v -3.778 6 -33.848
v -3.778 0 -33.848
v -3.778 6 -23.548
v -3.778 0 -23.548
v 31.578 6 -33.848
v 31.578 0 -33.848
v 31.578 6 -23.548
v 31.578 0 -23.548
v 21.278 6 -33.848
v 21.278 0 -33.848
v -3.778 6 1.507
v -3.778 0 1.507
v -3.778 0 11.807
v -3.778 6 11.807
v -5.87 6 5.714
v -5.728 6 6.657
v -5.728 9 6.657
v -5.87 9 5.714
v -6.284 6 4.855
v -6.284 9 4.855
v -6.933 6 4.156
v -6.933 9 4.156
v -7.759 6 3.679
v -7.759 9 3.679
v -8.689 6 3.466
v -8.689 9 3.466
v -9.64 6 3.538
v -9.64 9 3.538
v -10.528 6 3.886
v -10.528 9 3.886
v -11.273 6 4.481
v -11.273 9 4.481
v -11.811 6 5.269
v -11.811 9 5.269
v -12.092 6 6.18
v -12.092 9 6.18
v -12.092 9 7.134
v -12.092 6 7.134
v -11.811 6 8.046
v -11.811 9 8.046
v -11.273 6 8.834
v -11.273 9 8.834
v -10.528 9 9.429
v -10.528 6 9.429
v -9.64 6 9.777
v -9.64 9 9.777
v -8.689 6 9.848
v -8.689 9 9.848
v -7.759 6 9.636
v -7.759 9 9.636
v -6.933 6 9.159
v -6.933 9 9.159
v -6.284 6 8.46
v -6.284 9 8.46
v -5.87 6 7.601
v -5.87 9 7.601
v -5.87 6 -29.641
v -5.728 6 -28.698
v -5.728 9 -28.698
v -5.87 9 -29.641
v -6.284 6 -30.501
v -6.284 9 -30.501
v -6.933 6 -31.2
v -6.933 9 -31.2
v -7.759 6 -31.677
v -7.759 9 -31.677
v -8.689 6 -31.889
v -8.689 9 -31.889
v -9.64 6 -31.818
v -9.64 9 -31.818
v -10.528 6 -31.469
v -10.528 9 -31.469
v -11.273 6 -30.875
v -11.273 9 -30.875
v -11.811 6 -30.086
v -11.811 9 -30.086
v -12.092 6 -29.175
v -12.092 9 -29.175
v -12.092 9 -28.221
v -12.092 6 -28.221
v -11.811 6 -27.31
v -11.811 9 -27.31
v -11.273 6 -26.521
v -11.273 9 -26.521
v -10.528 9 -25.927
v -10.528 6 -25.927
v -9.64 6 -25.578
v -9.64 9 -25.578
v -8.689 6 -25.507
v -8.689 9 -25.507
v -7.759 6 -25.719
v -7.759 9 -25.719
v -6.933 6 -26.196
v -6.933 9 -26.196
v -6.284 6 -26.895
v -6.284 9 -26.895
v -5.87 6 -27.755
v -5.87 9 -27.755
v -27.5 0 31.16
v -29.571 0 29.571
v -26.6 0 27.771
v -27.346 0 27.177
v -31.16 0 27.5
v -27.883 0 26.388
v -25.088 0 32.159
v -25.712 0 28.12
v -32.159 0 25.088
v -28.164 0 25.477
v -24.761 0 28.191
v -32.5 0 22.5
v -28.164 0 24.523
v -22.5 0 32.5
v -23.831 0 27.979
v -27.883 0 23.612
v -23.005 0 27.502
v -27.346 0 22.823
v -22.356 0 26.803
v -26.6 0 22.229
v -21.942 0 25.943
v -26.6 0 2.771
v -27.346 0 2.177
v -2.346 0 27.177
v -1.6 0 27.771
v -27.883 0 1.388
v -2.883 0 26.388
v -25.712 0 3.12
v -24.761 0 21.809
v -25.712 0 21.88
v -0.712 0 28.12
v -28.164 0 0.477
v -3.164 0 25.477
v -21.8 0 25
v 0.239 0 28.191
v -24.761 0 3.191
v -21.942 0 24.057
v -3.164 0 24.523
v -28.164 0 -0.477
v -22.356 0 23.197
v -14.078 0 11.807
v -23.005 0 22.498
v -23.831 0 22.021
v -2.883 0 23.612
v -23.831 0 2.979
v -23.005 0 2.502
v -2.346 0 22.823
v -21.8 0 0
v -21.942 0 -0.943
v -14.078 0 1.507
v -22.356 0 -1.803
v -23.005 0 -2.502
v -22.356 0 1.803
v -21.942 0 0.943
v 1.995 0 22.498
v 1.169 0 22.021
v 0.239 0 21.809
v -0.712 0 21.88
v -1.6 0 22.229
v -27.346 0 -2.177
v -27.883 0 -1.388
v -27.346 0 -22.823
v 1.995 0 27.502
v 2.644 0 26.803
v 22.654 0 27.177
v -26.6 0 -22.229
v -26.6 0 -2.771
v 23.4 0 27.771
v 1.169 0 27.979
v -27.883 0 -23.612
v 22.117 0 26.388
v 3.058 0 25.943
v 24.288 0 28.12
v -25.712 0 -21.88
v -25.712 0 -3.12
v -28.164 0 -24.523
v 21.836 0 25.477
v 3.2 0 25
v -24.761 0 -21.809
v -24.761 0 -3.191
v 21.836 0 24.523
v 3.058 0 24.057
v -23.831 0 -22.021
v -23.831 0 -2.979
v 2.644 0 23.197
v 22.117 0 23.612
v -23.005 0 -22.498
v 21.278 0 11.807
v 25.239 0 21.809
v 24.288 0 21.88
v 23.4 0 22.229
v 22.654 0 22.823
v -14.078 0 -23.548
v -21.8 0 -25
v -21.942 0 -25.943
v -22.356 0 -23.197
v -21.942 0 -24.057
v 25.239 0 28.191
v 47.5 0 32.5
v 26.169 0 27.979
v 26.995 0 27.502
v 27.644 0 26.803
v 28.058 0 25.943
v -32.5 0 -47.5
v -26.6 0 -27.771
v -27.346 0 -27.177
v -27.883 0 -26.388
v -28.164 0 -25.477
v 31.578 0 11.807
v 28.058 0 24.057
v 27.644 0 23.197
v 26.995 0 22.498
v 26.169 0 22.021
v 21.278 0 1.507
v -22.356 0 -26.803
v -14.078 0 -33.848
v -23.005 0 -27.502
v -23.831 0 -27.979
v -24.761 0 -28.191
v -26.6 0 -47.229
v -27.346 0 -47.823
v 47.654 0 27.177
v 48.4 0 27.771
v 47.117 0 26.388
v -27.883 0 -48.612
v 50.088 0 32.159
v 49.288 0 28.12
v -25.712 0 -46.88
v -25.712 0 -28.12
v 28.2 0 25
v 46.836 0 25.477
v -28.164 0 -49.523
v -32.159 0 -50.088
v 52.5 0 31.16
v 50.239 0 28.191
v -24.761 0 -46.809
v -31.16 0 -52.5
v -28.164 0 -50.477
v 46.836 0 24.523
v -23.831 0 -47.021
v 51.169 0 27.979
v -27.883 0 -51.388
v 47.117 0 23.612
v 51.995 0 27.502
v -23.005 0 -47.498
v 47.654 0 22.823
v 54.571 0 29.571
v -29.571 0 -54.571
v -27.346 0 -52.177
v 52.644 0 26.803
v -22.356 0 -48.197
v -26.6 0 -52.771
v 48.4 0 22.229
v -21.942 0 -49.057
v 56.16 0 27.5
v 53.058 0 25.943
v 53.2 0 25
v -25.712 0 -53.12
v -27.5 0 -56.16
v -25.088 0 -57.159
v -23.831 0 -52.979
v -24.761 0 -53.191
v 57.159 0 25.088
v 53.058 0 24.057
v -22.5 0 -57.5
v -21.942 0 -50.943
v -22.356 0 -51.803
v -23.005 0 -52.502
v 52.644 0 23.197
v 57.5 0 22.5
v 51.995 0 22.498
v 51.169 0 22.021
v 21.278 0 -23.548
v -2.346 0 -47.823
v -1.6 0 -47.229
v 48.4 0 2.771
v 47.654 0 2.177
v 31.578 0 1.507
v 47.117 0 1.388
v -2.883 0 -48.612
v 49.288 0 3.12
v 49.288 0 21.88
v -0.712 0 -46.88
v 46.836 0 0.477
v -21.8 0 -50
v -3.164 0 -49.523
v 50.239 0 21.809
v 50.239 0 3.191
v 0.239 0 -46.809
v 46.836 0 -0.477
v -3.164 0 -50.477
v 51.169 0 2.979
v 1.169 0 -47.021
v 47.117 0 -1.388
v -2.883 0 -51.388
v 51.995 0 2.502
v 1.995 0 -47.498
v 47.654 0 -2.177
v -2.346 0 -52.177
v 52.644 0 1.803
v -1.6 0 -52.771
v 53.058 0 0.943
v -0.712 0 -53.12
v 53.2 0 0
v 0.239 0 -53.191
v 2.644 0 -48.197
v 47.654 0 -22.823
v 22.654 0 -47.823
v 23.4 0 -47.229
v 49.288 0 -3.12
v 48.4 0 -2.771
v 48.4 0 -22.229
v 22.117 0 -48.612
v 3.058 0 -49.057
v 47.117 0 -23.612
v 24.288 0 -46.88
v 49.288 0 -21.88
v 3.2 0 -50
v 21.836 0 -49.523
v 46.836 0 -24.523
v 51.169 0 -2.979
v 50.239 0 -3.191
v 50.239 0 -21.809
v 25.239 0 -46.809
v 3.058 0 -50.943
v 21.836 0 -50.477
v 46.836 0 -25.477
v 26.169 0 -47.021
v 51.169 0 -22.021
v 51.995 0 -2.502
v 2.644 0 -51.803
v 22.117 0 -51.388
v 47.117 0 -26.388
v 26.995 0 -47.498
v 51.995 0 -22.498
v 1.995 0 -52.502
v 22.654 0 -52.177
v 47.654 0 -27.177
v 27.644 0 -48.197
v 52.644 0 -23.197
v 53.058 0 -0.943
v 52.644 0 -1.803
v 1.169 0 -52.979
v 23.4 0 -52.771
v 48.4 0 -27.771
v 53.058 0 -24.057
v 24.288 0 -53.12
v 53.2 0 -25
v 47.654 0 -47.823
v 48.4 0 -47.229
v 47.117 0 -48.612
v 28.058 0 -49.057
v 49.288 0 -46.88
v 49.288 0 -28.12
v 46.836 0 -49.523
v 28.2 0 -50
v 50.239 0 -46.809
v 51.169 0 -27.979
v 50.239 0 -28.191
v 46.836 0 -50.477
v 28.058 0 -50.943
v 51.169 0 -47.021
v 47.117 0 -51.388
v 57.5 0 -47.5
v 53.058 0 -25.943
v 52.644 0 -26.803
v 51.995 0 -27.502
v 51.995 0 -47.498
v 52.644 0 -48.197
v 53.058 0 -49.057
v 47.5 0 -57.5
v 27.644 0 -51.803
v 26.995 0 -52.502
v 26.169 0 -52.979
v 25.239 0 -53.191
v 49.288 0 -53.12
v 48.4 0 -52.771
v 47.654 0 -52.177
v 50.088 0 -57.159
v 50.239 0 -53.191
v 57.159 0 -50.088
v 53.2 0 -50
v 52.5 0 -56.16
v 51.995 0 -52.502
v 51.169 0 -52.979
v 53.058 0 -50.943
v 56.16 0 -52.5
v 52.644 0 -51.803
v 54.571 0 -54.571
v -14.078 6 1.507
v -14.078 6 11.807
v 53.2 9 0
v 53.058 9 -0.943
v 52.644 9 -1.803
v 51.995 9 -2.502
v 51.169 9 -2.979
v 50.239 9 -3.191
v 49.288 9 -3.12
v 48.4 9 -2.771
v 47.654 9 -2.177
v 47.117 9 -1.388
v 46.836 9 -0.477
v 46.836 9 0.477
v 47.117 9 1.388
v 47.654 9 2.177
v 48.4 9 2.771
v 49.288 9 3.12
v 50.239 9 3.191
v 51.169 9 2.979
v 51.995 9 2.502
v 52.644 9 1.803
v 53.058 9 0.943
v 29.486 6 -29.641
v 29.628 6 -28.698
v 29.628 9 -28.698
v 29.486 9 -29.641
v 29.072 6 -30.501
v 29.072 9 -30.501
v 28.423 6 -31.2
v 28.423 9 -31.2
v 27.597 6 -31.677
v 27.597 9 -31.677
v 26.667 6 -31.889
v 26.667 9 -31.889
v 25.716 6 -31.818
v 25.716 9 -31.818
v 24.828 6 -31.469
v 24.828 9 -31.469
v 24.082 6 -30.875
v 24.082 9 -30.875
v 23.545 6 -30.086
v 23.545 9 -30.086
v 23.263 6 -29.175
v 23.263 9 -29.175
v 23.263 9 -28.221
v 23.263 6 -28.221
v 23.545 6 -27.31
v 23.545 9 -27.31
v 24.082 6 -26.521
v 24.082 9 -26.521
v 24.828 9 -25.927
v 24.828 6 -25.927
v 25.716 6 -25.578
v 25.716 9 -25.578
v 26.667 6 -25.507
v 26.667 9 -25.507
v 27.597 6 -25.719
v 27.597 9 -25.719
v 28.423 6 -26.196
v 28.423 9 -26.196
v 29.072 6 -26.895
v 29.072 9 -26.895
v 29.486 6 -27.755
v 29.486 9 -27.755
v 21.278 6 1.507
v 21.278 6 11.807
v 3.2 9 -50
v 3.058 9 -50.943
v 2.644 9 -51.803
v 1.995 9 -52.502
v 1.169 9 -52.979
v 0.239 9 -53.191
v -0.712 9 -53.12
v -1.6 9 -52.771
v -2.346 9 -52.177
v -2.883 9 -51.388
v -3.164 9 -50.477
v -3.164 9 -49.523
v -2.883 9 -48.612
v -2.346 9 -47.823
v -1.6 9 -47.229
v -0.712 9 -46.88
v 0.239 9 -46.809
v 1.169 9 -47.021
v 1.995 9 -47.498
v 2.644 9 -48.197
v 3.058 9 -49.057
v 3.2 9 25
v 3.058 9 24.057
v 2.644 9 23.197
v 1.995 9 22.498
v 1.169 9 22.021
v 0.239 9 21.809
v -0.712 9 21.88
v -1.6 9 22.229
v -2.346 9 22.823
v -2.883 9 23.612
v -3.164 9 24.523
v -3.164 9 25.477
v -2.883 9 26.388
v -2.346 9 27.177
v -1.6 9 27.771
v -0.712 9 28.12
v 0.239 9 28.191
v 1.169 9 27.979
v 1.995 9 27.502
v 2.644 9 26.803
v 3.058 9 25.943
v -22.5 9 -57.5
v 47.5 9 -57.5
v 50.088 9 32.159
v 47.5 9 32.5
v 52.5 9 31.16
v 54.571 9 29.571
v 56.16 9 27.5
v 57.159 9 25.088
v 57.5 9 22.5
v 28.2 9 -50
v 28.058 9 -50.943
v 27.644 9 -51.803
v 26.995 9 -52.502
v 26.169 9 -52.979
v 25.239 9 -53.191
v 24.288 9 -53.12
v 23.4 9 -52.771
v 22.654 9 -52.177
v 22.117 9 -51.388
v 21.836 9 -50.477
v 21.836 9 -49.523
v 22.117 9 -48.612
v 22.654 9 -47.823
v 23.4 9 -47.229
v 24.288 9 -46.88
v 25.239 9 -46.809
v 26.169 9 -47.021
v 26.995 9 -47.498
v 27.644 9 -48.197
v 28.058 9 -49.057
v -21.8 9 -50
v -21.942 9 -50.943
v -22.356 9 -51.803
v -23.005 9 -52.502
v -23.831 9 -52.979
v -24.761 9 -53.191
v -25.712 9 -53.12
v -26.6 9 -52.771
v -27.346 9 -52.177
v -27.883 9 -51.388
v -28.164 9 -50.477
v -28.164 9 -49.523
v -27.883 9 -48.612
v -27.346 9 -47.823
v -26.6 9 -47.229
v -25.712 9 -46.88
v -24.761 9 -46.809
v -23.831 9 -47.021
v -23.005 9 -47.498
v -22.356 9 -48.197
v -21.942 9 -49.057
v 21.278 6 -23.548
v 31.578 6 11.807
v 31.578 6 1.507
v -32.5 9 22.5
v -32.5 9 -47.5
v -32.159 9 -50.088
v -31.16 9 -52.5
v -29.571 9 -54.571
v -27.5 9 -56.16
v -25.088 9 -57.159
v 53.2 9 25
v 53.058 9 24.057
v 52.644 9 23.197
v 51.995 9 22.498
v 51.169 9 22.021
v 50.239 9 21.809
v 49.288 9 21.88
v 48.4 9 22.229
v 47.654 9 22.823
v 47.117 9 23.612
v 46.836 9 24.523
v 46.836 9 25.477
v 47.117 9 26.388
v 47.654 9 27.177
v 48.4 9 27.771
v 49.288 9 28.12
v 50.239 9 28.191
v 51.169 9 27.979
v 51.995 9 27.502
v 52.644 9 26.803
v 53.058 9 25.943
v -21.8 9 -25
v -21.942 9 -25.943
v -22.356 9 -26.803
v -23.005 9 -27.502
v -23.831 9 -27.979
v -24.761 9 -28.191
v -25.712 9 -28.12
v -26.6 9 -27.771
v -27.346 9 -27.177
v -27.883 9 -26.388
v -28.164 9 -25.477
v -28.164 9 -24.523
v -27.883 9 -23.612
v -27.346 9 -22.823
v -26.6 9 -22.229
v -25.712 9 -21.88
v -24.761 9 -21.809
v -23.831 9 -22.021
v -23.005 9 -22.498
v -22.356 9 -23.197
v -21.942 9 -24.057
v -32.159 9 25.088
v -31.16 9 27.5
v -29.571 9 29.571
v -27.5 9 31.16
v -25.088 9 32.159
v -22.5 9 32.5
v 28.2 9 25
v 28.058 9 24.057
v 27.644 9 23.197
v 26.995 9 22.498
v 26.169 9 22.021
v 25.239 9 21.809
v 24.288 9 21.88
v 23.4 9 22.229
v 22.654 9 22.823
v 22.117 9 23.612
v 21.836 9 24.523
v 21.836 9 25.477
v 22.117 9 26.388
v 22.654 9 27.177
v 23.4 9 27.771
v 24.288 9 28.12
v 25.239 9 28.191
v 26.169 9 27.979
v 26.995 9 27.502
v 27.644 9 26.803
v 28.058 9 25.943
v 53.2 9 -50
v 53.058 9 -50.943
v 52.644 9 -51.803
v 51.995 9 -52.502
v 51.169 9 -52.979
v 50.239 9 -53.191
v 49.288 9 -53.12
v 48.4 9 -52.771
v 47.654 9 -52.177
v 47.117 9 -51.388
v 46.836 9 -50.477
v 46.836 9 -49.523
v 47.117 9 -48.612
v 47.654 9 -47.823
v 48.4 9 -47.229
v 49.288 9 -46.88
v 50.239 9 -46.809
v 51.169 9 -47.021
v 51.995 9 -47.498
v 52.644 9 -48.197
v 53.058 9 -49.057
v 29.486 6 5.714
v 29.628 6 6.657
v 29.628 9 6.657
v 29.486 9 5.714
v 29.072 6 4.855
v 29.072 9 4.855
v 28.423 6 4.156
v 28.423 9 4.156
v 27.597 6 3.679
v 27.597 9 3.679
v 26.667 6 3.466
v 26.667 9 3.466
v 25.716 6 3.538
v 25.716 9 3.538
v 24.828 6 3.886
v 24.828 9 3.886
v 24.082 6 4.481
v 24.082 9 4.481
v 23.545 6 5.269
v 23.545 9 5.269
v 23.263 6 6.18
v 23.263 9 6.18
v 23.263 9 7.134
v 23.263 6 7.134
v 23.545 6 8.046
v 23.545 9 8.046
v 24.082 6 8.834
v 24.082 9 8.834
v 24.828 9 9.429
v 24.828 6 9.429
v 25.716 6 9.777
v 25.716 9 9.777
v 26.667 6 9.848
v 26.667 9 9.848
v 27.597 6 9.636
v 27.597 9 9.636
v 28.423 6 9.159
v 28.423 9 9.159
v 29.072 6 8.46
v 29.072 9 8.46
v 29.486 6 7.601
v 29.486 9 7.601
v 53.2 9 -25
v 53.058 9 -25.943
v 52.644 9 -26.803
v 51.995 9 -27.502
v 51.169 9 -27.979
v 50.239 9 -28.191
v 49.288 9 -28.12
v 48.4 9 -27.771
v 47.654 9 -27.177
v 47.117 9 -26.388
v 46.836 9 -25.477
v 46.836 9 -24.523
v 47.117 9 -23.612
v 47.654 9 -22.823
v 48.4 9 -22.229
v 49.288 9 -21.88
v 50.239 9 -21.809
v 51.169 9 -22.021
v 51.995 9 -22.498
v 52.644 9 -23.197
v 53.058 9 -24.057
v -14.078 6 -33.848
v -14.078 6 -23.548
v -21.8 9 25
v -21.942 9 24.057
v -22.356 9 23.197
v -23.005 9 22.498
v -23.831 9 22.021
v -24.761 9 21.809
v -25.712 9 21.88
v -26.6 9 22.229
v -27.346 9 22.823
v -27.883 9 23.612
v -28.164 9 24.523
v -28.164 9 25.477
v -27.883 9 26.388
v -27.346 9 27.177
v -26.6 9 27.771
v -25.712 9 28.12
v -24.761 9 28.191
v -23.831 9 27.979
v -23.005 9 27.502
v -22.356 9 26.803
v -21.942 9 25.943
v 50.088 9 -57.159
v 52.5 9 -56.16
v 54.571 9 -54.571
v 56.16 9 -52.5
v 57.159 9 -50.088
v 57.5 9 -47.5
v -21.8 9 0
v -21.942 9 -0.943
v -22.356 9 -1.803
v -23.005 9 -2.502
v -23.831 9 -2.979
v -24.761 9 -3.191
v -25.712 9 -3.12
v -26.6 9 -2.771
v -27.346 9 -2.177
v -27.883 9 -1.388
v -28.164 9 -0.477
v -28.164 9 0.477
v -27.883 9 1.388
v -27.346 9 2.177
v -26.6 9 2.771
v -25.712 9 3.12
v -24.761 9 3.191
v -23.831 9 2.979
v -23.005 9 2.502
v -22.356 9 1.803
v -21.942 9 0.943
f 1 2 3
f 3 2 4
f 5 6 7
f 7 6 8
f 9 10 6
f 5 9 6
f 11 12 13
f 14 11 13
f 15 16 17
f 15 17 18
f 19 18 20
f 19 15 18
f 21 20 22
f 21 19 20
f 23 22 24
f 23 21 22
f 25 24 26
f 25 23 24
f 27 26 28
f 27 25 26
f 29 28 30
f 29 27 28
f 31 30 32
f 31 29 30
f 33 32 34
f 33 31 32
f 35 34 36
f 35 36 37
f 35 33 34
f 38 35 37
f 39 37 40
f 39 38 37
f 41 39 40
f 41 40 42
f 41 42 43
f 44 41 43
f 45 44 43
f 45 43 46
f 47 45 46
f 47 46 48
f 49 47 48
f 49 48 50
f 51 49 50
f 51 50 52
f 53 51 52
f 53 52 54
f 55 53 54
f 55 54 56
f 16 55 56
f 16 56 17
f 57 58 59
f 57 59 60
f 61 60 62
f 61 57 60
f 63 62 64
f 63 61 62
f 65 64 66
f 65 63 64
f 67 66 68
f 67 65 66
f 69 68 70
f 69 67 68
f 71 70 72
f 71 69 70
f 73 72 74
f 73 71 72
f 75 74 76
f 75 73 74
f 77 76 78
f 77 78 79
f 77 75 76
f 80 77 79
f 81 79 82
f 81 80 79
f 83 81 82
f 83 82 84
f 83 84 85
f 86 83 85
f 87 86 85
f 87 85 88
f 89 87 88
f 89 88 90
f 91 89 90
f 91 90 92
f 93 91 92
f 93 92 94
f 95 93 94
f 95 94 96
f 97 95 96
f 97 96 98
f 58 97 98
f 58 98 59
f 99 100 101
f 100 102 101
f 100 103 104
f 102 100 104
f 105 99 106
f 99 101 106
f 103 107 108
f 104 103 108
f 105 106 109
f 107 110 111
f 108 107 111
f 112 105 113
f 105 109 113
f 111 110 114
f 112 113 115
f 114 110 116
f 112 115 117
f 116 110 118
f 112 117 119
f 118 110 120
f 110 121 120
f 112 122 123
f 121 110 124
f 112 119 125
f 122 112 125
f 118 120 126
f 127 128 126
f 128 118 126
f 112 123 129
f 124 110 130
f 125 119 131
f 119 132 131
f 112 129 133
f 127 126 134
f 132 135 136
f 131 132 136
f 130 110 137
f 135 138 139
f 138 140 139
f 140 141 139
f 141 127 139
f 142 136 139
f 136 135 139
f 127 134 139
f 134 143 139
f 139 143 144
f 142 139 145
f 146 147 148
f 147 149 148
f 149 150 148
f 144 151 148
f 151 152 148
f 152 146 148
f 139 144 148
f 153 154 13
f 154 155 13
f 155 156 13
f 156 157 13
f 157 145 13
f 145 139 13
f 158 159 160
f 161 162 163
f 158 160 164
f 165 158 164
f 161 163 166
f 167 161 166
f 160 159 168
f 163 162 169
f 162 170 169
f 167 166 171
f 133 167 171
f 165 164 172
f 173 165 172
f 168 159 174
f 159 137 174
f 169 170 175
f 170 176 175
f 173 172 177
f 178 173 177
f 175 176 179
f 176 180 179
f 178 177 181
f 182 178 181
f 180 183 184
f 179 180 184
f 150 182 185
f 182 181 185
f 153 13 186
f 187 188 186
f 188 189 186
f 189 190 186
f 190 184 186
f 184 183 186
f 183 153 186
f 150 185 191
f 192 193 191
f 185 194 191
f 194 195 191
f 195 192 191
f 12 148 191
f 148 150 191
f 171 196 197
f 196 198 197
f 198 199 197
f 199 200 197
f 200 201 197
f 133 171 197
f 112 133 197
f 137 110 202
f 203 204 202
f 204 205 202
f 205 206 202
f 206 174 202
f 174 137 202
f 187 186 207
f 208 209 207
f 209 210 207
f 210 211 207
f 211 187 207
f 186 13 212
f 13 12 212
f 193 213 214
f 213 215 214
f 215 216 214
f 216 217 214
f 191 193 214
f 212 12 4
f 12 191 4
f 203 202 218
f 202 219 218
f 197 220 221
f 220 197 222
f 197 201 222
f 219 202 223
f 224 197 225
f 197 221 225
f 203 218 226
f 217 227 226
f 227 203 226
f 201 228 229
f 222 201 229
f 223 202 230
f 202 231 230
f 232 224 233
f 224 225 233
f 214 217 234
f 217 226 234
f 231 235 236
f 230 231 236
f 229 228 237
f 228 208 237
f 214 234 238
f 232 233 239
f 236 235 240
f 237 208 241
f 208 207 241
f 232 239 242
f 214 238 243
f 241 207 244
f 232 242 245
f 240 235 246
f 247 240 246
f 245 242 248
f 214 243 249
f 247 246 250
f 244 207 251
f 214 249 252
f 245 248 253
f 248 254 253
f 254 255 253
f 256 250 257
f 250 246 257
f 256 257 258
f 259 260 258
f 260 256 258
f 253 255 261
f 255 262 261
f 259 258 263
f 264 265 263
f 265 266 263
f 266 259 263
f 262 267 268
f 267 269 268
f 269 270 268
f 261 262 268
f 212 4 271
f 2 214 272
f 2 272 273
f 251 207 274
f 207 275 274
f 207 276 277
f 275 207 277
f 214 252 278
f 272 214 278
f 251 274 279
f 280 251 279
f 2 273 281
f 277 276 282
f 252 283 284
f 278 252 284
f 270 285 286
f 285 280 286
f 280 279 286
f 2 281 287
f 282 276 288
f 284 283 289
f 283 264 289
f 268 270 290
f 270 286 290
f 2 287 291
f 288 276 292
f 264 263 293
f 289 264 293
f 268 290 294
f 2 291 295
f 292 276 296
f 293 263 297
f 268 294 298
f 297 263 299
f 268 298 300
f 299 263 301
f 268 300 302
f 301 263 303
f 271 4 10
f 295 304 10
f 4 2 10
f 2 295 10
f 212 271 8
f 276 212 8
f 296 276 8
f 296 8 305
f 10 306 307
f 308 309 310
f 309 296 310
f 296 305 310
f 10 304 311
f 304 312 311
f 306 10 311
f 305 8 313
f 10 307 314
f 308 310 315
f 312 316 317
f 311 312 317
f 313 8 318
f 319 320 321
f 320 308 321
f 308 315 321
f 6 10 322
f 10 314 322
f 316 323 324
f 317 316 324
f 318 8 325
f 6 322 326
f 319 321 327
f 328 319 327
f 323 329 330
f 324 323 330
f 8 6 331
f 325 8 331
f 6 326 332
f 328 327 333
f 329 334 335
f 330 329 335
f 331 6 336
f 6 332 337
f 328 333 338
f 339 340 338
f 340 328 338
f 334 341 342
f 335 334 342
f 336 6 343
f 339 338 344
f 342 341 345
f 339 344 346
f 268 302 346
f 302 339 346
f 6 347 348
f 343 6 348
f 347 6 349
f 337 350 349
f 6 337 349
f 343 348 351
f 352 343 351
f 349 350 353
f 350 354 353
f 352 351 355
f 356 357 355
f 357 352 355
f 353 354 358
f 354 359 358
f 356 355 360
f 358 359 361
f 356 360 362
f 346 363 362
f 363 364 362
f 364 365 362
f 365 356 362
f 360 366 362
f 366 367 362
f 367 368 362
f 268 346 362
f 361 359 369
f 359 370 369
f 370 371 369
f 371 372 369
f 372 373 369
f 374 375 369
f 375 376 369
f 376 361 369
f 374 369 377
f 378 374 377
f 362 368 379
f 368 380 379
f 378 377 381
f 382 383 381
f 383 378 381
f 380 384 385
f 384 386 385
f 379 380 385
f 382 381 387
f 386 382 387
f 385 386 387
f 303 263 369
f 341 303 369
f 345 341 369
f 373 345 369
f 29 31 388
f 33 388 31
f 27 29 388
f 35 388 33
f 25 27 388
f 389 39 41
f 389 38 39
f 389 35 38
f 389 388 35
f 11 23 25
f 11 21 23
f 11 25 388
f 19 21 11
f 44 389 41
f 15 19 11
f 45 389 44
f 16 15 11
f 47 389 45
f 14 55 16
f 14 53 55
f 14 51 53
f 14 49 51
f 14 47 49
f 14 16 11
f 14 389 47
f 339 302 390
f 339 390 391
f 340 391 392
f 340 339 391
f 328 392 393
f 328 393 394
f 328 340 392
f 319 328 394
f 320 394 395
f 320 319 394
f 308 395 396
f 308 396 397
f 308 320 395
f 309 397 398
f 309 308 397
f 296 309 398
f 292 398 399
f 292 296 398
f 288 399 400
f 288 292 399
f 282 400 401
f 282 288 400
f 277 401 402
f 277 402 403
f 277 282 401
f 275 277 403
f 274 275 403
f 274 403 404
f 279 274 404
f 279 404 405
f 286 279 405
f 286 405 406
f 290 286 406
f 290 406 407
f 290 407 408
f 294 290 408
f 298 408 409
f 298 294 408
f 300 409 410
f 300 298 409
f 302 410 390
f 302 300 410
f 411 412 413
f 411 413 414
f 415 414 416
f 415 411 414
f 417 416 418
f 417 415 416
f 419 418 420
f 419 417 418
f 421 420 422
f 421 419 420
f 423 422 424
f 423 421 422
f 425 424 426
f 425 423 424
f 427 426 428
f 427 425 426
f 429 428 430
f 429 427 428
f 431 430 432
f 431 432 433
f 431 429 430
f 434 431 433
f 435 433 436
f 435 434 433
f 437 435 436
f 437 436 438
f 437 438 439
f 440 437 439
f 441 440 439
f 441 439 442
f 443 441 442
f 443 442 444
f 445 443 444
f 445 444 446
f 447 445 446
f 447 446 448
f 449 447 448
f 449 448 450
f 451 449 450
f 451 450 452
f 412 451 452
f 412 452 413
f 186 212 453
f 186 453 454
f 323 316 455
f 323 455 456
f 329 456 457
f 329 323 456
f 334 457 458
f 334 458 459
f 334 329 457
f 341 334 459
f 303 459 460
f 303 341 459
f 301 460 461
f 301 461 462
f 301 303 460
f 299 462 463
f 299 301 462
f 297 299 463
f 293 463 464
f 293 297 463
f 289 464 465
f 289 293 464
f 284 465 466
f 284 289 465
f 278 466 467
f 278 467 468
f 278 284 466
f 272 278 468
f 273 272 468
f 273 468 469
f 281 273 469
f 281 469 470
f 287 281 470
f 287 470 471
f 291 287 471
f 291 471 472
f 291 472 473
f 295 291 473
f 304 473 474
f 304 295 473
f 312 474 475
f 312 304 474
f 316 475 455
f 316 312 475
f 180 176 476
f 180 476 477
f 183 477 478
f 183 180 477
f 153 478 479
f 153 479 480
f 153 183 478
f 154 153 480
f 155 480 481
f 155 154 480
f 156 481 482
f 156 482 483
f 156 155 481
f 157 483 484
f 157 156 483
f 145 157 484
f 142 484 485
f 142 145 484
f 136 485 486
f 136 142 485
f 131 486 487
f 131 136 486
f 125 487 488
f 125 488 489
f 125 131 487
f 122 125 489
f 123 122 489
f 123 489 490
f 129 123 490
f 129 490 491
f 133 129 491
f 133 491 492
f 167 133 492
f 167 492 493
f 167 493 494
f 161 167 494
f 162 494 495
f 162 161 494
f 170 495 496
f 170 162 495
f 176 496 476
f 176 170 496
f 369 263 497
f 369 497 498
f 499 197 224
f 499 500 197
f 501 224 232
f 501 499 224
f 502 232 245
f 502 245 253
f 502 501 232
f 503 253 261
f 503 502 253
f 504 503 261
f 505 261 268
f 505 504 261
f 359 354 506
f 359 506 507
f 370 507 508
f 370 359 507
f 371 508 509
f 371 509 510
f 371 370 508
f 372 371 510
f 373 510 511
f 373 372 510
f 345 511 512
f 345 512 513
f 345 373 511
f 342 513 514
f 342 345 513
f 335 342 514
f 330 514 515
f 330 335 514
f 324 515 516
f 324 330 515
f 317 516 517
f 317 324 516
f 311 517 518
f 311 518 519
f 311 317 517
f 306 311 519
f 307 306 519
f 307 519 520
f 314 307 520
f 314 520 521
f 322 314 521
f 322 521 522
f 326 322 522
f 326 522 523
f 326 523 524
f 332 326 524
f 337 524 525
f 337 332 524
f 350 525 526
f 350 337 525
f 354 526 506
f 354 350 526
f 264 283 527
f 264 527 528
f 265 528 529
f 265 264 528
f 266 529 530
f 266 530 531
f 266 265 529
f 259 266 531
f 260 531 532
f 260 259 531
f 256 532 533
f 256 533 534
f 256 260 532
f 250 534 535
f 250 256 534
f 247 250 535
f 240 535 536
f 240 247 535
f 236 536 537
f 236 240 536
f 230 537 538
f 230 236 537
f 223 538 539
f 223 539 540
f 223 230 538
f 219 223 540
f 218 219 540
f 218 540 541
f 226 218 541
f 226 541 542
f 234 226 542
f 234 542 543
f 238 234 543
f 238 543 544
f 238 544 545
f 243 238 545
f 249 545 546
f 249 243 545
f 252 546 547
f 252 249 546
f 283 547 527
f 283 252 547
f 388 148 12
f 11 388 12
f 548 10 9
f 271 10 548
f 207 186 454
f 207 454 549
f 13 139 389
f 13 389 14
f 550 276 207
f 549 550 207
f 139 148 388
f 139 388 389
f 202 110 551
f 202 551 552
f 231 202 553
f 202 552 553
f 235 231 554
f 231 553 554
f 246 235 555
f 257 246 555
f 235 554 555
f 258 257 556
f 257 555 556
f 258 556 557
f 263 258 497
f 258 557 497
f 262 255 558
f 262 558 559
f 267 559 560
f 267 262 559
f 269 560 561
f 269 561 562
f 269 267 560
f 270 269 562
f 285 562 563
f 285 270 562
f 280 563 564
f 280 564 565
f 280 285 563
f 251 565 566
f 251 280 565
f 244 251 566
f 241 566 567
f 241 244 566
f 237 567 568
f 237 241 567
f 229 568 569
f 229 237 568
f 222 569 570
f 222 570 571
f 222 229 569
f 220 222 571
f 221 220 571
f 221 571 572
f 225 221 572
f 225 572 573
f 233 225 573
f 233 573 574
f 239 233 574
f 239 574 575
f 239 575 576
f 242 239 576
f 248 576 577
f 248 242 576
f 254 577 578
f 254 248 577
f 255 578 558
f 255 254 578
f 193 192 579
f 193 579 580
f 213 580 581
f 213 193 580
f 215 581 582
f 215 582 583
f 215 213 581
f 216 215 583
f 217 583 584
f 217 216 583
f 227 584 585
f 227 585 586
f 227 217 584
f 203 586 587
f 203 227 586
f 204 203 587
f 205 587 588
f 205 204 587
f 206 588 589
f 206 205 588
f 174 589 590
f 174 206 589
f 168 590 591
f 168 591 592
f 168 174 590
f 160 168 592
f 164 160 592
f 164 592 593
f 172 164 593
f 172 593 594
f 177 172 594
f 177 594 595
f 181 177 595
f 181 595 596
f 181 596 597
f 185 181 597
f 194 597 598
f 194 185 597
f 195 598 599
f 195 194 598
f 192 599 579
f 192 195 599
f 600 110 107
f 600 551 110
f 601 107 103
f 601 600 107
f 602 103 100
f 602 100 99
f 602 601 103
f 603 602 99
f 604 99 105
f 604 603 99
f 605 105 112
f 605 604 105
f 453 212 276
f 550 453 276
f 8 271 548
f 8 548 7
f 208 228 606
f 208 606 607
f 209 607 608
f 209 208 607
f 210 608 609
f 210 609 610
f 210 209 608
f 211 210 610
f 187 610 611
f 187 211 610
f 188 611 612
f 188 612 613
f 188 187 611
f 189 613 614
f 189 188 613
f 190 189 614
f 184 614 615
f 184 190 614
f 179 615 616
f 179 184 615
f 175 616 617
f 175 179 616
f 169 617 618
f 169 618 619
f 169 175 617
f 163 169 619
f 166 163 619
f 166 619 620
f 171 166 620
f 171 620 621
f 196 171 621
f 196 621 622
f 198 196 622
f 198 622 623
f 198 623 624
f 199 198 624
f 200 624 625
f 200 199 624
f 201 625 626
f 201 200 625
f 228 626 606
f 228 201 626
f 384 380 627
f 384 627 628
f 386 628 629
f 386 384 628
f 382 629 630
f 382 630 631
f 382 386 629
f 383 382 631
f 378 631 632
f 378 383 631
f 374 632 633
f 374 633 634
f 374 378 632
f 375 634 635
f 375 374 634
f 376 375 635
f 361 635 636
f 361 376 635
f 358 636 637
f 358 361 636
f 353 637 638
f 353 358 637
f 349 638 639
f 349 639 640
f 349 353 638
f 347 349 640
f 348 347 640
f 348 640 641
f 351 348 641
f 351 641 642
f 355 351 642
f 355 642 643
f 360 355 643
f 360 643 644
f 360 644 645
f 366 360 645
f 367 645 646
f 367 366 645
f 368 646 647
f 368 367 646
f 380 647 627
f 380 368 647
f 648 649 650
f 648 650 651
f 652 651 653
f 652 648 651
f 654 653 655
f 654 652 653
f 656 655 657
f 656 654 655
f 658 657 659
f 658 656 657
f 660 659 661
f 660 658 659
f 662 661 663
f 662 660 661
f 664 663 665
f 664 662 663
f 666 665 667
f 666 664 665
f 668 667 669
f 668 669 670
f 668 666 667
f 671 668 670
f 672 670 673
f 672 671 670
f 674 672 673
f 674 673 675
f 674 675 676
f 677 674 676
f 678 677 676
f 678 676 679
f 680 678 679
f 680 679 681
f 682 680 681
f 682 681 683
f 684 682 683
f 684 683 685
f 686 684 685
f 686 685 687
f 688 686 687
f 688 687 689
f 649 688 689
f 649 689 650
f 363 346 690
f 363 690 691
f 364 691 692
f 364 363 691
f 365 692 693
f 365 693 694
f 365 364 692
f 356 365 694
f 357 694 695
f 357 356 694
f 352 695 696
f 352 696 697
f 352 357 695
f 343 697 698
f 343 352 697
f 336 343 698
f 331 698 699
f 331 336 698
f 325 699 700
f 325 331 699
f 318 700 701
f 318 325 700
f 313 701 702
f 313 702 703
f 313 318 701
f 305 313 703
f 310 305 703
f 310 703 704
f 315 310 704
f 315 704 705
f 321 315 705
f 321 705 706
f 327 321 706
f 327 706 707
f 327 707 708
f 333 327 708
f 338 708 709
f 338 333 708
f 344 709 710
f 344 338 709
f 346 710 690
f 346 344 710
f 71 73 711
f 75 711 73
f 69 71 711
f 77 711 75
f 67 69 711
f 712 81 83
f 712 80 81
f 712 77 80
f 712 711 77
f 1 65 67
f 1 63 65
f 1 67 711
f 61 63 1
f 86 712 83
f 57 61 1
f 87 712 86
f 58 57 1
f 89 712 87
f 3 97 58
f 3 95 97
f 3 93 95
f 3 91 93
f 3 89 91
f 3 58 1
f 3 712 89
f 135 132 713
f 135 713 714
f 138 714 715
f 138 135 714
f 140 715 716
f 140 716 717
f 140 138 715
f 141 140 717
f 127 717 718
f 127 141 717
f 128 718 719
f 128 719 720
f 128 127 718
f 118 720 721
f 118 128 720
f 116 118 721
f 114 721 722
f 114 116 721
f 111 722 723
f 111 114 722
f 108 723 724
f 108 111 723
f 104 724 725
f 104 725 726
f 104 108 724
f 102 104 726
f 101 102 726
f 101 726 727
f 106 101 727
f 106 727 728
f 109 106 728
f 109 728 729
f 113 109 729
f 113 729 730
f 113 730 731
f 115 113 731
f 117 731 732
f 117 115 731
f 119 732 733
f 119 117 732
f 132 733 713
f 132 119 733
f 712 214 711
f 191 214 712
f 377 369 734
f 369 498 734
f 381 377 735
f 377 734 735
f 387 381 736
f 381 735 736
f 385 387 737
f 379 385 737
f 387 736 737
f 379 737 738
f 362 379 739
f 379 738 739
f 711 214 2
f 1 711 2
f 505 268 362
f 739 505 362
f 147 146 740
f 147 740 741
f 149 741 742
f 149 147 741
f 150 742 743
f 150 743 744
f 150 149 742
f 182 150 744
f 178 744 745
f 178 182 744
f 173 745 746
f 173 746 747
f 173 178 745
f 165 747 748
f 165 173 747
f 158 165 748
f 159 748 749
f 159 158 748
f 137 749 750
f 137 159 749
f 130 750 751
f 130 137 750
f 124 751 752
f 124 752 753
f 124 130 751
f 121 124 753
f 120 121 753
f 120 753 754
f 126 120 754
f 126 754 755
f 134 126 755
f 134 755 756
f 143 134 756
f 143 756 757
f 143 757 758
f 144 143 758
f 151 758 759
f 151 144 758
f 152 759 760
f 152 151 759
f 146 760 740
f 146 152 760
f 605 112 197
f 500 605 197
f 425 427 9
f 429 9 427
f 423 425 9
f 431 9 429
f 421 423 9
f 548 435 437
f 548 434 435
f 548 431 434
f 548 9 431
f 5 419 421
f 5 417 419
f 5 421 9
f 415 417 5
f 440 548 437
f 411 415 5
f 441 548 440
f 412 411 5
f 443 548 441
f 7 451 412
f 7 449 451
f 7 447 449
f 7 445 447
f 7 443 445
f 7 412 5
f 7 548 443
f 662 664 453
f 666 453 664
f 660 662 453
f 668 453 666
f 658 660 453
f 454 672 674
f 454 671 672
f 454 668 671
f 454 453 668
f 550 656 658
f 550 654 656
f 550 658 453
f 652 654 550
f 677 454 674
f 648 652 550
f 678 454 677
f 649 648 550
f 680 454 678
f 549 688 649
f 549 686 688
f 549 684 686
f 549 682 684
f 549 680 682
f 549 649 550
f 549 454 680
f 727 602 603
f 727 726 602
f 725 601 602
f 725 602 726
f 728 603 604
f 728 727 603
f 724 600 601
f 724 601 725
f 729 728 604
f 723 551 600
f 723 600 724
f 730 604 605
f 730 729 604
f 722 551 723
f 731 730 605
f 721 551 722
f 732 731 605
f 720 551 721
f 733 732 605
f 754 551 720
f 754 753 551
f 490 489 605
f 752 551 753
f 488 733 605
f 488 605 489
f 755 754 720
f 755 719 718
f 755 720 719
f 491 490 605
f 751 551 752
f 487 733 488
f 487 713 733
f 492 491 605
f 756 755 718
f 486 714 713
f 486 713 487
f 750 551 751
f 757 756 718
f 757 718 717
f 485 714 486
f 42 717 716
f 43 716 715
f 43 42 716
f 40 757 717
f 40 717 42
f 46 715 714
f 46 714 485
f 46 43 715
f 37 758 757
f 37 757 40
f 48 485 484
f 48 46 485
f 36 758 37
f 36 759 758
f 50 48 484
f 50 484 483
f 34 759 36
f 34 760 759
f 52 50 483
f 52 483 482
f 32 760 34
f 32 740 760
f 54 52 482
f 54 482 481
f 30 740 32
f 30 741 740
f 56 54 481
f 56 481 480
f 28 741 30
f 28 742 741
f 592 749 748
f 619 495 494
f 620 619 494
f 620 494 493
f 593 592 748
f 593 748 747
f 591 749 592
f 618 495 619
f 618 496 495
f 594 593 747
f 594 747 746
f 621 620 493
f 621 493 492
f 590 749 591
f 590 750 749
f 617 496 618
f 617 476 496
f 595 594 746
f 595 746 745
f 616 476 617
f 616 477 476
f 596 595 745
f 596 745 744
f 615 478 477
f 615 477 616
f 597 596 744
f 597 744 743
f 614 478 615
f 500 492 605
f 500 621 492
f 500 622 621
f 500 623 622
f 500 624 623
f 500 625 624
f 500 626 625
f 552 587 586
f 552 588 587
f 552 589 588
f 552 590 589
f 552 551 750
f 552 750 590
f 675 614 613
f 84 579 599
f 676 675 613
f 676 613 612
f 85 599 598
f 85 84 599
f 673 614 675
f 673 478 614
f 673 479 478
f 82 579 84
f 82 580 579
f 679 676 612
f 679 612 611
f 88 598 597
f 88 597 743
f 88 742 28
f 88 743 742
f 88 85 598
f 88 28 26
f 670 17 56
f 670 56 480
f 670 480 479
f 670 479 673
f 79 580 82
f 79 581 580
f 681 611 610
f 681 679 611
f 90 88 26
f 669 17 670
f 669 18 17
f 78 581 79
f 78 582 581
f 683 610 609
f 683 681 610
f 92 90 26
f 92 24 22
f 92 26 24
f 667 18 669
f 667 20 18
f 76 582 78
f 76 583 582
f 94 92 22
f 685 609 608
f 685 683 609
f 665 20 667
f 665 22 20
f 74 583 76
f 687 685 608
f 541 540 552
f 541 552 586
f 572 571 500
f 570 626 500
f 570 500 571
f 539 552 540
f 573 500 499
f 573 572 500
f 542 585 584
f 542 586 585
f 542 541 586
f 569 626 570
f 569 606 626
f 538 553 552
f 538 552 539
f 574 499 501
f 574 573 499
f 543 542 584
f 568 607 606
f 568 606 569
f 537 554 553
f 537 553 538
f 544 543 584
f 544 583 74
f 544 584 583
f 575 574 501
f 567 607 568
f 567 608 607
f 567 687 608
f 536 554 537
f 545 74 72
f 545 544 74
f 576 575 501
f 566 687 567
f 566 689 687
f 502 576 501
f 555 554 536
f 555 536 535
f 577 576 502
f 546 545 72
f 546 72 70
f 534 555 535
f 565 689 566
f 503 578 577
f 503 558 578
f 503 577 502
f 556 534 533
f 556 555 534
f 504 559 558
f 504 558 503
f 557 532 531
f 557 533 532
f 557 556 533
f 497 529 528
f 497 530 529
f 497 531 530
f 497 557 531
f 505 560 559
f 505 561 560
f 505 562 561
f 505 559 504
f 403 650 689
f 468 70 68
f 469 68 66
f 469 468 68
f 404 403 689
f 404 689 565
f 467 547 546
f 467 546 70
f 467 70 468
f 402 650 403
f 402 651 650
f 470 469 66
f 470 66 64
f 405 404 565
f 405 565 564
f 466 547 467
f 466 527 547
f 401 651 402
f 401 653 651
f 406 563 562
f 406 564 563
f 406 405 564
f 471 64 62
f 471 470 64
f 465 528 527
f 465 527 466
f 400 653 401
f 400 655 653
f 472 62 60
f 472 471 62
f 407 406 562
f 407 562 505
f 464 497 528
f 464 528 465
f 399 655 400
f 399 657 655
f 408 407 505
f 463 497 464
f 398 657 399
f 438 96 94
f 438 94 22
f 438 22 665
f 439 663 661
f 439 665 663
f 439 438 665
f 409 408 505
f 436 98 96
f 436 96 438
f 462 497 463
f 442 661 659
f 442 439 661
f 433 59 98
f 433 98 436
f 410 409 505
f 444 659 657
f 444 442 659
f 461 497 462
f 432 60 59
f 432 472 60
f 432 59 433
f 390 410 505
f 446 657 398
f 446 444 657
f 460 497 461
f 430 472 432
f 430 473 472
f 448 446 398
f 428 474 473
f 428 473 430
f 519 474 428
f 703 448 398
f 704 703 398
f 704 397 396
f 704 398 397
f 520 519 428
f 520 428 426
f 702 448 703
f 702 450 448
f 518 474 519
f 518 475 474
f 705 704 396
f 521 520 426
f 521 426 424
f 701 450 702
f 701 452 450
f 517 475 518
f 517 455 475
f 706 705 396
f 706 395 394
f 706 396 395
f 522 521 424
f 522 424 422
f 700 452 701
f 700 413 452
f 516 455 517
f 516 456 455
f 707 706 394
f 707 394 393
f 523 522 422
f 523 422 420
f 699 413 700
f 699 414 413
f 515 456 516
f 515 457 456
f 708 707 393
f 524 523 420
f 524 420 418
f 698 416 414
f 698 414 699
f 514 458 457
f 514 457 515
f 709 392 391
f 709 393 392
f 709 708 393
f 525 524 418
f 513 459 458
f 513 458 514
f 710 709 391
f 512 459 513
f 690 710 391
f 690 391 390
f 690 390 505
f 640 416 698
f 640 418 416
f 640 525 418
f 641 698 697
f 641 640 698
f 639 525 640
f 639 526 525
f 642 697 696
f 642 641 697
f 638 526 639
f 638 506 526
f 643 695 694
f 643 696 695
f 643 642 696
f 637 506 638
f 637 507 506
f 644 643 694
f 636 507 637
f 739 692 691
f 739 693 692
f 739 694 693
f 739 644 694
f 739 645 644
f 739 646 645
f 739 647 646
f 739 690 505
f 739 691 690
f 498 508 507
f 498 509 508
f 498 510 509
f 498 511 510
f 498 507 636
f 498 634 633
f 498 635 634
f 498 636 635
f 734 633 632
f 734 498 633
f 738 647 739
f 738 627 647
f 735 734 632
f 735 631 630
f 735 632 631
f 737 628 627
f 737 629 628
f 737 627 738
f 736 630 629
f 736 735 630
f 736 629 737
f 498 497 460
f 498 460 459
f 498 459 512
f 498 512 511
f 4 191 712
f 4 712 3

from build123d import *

# Parameters (mm, degrees)
SKETCH_1_W          = 90
SKETCH_1_H          = 90
SKETCH_1_R          = 3.2
EXTRUDE_1_DEPTH     = 9
SKETCH_2_W          = 10.3
SKETCH_2_H          = 10.3
CUT_EXTRUDE_1_DEPTH = 6
FILLET_1_R          = 10


with BuildPart() as part:
    # 스케치1 → 보스-돌출1 (new body)
    with BuildSketch(Plane(origin=(0, 0, 0), x_dir=(1, 0, 0), z_dir=(0, 1, 0))):
        with Locations((12.5, 12.5)):
            Rectangle(SKETCH_1_W, SKETCH_1_H)
        with Locations((-8.92766953, 28.6979618)):
            Circle(SKETCH_1_R, mode=Mode.SUBTRACT)
        with Locations((26.42766953, 28.6979618)):
            Circle(SKETCH_1_R, mode=Mode.SUBTRACT)
        with Locations((-8.92766953, -6.65737726)):
            Circle(SKETCH_1_R, mode=Mode.SUBTRACT)
        with Locations((26.42766953, -6.65737726)):
            Circle(SKETCH_1_R, mode=Mode.SUBTRACT)
        with Locations((25, -25)):
            Circle(SKETCH_1_R, mode=Mode.SUBTRACT)
        with Locations((50, 25)):
            Circle(SKETCH_1_R, mode=Mode.SUBTRACT)
        with Locations((50, -25)):
            Circle(SKETCH_1_R, mode=Mode.SUBTRACT)
        with Locations((0, -25)):
            Circle(SKETCH_1_R, mode=Mode.SUBTRACT)
        with Locations((50, 50)):
            Circle(SKETCH_1_R, mode=Mode.SUBTRACT)
        with Locations((-25, 50)):
            Circle(SKETCH_1_R, mode=Mode.SUBTRACT)
        with Locations((-25, -25)):
            Circle(SKETCH_1_R, mode=Mode.SUBTRACT)
        with Locations((-25, 25)):
            Circle(SKETCH_1_R, mode=Mode.SUBTRACT)
        with Locations((-25, 0)):
            Circle(SKETCH_1_R, mode=Mode.SUBTRACT)
        with Locations((50, 0)):
            Circle(SKETCH_1_R, mode=Mode.SUBTRACT)
        with Locations((25, 50)):
            Circle(SKETCH_1_R, mode=Mode.SUBTRACT)
        with Locations((0, 50)):
            Circle(SKETCH_1_R, mode=Mode.SUBTRACT)
    extrude(amount=EXTRUDE_1_DEPTH)

    # 스케치2 → 컷-돌출1 (cut)
    with BuildSketch(Plane.XZ):
        with Locations((-8.92766953, 6.65737726)):
            Rectangle(SKETCH_2_W, SKETCH_2_H)
        with Locations((26.42766953, 6.65737726)):
            Rectangle(SKETCH_2_W, SKETCH_2_H)
        with Locations((26.42766953, -28.6979618)):
            Rectangle(SKETCH_2_W, SKETCH_2_H)
        with Locations((-8.92766953, -28.6979618)):
            Rectangle(SKETCH_2_W, SKETCH_2_H)
    extrude(amount=-CUT_EXTRUDE_1_DEPTH, mode=Mode.SUBTRACT)

    # 필렛1
    fillet_1_edges = [part.edges().sort_by_distance(p)[0] for p in [
        (-32.5, 4.5, 32.5),
        (-32.5, 4.5, -57.5),
        (57.5, 4.5, -57.5),
        (57.5, 4.5, 32.5),
    ]]
    fillet(fillet_1_edges, radius=FILLET_1_R)


solid = part.part
